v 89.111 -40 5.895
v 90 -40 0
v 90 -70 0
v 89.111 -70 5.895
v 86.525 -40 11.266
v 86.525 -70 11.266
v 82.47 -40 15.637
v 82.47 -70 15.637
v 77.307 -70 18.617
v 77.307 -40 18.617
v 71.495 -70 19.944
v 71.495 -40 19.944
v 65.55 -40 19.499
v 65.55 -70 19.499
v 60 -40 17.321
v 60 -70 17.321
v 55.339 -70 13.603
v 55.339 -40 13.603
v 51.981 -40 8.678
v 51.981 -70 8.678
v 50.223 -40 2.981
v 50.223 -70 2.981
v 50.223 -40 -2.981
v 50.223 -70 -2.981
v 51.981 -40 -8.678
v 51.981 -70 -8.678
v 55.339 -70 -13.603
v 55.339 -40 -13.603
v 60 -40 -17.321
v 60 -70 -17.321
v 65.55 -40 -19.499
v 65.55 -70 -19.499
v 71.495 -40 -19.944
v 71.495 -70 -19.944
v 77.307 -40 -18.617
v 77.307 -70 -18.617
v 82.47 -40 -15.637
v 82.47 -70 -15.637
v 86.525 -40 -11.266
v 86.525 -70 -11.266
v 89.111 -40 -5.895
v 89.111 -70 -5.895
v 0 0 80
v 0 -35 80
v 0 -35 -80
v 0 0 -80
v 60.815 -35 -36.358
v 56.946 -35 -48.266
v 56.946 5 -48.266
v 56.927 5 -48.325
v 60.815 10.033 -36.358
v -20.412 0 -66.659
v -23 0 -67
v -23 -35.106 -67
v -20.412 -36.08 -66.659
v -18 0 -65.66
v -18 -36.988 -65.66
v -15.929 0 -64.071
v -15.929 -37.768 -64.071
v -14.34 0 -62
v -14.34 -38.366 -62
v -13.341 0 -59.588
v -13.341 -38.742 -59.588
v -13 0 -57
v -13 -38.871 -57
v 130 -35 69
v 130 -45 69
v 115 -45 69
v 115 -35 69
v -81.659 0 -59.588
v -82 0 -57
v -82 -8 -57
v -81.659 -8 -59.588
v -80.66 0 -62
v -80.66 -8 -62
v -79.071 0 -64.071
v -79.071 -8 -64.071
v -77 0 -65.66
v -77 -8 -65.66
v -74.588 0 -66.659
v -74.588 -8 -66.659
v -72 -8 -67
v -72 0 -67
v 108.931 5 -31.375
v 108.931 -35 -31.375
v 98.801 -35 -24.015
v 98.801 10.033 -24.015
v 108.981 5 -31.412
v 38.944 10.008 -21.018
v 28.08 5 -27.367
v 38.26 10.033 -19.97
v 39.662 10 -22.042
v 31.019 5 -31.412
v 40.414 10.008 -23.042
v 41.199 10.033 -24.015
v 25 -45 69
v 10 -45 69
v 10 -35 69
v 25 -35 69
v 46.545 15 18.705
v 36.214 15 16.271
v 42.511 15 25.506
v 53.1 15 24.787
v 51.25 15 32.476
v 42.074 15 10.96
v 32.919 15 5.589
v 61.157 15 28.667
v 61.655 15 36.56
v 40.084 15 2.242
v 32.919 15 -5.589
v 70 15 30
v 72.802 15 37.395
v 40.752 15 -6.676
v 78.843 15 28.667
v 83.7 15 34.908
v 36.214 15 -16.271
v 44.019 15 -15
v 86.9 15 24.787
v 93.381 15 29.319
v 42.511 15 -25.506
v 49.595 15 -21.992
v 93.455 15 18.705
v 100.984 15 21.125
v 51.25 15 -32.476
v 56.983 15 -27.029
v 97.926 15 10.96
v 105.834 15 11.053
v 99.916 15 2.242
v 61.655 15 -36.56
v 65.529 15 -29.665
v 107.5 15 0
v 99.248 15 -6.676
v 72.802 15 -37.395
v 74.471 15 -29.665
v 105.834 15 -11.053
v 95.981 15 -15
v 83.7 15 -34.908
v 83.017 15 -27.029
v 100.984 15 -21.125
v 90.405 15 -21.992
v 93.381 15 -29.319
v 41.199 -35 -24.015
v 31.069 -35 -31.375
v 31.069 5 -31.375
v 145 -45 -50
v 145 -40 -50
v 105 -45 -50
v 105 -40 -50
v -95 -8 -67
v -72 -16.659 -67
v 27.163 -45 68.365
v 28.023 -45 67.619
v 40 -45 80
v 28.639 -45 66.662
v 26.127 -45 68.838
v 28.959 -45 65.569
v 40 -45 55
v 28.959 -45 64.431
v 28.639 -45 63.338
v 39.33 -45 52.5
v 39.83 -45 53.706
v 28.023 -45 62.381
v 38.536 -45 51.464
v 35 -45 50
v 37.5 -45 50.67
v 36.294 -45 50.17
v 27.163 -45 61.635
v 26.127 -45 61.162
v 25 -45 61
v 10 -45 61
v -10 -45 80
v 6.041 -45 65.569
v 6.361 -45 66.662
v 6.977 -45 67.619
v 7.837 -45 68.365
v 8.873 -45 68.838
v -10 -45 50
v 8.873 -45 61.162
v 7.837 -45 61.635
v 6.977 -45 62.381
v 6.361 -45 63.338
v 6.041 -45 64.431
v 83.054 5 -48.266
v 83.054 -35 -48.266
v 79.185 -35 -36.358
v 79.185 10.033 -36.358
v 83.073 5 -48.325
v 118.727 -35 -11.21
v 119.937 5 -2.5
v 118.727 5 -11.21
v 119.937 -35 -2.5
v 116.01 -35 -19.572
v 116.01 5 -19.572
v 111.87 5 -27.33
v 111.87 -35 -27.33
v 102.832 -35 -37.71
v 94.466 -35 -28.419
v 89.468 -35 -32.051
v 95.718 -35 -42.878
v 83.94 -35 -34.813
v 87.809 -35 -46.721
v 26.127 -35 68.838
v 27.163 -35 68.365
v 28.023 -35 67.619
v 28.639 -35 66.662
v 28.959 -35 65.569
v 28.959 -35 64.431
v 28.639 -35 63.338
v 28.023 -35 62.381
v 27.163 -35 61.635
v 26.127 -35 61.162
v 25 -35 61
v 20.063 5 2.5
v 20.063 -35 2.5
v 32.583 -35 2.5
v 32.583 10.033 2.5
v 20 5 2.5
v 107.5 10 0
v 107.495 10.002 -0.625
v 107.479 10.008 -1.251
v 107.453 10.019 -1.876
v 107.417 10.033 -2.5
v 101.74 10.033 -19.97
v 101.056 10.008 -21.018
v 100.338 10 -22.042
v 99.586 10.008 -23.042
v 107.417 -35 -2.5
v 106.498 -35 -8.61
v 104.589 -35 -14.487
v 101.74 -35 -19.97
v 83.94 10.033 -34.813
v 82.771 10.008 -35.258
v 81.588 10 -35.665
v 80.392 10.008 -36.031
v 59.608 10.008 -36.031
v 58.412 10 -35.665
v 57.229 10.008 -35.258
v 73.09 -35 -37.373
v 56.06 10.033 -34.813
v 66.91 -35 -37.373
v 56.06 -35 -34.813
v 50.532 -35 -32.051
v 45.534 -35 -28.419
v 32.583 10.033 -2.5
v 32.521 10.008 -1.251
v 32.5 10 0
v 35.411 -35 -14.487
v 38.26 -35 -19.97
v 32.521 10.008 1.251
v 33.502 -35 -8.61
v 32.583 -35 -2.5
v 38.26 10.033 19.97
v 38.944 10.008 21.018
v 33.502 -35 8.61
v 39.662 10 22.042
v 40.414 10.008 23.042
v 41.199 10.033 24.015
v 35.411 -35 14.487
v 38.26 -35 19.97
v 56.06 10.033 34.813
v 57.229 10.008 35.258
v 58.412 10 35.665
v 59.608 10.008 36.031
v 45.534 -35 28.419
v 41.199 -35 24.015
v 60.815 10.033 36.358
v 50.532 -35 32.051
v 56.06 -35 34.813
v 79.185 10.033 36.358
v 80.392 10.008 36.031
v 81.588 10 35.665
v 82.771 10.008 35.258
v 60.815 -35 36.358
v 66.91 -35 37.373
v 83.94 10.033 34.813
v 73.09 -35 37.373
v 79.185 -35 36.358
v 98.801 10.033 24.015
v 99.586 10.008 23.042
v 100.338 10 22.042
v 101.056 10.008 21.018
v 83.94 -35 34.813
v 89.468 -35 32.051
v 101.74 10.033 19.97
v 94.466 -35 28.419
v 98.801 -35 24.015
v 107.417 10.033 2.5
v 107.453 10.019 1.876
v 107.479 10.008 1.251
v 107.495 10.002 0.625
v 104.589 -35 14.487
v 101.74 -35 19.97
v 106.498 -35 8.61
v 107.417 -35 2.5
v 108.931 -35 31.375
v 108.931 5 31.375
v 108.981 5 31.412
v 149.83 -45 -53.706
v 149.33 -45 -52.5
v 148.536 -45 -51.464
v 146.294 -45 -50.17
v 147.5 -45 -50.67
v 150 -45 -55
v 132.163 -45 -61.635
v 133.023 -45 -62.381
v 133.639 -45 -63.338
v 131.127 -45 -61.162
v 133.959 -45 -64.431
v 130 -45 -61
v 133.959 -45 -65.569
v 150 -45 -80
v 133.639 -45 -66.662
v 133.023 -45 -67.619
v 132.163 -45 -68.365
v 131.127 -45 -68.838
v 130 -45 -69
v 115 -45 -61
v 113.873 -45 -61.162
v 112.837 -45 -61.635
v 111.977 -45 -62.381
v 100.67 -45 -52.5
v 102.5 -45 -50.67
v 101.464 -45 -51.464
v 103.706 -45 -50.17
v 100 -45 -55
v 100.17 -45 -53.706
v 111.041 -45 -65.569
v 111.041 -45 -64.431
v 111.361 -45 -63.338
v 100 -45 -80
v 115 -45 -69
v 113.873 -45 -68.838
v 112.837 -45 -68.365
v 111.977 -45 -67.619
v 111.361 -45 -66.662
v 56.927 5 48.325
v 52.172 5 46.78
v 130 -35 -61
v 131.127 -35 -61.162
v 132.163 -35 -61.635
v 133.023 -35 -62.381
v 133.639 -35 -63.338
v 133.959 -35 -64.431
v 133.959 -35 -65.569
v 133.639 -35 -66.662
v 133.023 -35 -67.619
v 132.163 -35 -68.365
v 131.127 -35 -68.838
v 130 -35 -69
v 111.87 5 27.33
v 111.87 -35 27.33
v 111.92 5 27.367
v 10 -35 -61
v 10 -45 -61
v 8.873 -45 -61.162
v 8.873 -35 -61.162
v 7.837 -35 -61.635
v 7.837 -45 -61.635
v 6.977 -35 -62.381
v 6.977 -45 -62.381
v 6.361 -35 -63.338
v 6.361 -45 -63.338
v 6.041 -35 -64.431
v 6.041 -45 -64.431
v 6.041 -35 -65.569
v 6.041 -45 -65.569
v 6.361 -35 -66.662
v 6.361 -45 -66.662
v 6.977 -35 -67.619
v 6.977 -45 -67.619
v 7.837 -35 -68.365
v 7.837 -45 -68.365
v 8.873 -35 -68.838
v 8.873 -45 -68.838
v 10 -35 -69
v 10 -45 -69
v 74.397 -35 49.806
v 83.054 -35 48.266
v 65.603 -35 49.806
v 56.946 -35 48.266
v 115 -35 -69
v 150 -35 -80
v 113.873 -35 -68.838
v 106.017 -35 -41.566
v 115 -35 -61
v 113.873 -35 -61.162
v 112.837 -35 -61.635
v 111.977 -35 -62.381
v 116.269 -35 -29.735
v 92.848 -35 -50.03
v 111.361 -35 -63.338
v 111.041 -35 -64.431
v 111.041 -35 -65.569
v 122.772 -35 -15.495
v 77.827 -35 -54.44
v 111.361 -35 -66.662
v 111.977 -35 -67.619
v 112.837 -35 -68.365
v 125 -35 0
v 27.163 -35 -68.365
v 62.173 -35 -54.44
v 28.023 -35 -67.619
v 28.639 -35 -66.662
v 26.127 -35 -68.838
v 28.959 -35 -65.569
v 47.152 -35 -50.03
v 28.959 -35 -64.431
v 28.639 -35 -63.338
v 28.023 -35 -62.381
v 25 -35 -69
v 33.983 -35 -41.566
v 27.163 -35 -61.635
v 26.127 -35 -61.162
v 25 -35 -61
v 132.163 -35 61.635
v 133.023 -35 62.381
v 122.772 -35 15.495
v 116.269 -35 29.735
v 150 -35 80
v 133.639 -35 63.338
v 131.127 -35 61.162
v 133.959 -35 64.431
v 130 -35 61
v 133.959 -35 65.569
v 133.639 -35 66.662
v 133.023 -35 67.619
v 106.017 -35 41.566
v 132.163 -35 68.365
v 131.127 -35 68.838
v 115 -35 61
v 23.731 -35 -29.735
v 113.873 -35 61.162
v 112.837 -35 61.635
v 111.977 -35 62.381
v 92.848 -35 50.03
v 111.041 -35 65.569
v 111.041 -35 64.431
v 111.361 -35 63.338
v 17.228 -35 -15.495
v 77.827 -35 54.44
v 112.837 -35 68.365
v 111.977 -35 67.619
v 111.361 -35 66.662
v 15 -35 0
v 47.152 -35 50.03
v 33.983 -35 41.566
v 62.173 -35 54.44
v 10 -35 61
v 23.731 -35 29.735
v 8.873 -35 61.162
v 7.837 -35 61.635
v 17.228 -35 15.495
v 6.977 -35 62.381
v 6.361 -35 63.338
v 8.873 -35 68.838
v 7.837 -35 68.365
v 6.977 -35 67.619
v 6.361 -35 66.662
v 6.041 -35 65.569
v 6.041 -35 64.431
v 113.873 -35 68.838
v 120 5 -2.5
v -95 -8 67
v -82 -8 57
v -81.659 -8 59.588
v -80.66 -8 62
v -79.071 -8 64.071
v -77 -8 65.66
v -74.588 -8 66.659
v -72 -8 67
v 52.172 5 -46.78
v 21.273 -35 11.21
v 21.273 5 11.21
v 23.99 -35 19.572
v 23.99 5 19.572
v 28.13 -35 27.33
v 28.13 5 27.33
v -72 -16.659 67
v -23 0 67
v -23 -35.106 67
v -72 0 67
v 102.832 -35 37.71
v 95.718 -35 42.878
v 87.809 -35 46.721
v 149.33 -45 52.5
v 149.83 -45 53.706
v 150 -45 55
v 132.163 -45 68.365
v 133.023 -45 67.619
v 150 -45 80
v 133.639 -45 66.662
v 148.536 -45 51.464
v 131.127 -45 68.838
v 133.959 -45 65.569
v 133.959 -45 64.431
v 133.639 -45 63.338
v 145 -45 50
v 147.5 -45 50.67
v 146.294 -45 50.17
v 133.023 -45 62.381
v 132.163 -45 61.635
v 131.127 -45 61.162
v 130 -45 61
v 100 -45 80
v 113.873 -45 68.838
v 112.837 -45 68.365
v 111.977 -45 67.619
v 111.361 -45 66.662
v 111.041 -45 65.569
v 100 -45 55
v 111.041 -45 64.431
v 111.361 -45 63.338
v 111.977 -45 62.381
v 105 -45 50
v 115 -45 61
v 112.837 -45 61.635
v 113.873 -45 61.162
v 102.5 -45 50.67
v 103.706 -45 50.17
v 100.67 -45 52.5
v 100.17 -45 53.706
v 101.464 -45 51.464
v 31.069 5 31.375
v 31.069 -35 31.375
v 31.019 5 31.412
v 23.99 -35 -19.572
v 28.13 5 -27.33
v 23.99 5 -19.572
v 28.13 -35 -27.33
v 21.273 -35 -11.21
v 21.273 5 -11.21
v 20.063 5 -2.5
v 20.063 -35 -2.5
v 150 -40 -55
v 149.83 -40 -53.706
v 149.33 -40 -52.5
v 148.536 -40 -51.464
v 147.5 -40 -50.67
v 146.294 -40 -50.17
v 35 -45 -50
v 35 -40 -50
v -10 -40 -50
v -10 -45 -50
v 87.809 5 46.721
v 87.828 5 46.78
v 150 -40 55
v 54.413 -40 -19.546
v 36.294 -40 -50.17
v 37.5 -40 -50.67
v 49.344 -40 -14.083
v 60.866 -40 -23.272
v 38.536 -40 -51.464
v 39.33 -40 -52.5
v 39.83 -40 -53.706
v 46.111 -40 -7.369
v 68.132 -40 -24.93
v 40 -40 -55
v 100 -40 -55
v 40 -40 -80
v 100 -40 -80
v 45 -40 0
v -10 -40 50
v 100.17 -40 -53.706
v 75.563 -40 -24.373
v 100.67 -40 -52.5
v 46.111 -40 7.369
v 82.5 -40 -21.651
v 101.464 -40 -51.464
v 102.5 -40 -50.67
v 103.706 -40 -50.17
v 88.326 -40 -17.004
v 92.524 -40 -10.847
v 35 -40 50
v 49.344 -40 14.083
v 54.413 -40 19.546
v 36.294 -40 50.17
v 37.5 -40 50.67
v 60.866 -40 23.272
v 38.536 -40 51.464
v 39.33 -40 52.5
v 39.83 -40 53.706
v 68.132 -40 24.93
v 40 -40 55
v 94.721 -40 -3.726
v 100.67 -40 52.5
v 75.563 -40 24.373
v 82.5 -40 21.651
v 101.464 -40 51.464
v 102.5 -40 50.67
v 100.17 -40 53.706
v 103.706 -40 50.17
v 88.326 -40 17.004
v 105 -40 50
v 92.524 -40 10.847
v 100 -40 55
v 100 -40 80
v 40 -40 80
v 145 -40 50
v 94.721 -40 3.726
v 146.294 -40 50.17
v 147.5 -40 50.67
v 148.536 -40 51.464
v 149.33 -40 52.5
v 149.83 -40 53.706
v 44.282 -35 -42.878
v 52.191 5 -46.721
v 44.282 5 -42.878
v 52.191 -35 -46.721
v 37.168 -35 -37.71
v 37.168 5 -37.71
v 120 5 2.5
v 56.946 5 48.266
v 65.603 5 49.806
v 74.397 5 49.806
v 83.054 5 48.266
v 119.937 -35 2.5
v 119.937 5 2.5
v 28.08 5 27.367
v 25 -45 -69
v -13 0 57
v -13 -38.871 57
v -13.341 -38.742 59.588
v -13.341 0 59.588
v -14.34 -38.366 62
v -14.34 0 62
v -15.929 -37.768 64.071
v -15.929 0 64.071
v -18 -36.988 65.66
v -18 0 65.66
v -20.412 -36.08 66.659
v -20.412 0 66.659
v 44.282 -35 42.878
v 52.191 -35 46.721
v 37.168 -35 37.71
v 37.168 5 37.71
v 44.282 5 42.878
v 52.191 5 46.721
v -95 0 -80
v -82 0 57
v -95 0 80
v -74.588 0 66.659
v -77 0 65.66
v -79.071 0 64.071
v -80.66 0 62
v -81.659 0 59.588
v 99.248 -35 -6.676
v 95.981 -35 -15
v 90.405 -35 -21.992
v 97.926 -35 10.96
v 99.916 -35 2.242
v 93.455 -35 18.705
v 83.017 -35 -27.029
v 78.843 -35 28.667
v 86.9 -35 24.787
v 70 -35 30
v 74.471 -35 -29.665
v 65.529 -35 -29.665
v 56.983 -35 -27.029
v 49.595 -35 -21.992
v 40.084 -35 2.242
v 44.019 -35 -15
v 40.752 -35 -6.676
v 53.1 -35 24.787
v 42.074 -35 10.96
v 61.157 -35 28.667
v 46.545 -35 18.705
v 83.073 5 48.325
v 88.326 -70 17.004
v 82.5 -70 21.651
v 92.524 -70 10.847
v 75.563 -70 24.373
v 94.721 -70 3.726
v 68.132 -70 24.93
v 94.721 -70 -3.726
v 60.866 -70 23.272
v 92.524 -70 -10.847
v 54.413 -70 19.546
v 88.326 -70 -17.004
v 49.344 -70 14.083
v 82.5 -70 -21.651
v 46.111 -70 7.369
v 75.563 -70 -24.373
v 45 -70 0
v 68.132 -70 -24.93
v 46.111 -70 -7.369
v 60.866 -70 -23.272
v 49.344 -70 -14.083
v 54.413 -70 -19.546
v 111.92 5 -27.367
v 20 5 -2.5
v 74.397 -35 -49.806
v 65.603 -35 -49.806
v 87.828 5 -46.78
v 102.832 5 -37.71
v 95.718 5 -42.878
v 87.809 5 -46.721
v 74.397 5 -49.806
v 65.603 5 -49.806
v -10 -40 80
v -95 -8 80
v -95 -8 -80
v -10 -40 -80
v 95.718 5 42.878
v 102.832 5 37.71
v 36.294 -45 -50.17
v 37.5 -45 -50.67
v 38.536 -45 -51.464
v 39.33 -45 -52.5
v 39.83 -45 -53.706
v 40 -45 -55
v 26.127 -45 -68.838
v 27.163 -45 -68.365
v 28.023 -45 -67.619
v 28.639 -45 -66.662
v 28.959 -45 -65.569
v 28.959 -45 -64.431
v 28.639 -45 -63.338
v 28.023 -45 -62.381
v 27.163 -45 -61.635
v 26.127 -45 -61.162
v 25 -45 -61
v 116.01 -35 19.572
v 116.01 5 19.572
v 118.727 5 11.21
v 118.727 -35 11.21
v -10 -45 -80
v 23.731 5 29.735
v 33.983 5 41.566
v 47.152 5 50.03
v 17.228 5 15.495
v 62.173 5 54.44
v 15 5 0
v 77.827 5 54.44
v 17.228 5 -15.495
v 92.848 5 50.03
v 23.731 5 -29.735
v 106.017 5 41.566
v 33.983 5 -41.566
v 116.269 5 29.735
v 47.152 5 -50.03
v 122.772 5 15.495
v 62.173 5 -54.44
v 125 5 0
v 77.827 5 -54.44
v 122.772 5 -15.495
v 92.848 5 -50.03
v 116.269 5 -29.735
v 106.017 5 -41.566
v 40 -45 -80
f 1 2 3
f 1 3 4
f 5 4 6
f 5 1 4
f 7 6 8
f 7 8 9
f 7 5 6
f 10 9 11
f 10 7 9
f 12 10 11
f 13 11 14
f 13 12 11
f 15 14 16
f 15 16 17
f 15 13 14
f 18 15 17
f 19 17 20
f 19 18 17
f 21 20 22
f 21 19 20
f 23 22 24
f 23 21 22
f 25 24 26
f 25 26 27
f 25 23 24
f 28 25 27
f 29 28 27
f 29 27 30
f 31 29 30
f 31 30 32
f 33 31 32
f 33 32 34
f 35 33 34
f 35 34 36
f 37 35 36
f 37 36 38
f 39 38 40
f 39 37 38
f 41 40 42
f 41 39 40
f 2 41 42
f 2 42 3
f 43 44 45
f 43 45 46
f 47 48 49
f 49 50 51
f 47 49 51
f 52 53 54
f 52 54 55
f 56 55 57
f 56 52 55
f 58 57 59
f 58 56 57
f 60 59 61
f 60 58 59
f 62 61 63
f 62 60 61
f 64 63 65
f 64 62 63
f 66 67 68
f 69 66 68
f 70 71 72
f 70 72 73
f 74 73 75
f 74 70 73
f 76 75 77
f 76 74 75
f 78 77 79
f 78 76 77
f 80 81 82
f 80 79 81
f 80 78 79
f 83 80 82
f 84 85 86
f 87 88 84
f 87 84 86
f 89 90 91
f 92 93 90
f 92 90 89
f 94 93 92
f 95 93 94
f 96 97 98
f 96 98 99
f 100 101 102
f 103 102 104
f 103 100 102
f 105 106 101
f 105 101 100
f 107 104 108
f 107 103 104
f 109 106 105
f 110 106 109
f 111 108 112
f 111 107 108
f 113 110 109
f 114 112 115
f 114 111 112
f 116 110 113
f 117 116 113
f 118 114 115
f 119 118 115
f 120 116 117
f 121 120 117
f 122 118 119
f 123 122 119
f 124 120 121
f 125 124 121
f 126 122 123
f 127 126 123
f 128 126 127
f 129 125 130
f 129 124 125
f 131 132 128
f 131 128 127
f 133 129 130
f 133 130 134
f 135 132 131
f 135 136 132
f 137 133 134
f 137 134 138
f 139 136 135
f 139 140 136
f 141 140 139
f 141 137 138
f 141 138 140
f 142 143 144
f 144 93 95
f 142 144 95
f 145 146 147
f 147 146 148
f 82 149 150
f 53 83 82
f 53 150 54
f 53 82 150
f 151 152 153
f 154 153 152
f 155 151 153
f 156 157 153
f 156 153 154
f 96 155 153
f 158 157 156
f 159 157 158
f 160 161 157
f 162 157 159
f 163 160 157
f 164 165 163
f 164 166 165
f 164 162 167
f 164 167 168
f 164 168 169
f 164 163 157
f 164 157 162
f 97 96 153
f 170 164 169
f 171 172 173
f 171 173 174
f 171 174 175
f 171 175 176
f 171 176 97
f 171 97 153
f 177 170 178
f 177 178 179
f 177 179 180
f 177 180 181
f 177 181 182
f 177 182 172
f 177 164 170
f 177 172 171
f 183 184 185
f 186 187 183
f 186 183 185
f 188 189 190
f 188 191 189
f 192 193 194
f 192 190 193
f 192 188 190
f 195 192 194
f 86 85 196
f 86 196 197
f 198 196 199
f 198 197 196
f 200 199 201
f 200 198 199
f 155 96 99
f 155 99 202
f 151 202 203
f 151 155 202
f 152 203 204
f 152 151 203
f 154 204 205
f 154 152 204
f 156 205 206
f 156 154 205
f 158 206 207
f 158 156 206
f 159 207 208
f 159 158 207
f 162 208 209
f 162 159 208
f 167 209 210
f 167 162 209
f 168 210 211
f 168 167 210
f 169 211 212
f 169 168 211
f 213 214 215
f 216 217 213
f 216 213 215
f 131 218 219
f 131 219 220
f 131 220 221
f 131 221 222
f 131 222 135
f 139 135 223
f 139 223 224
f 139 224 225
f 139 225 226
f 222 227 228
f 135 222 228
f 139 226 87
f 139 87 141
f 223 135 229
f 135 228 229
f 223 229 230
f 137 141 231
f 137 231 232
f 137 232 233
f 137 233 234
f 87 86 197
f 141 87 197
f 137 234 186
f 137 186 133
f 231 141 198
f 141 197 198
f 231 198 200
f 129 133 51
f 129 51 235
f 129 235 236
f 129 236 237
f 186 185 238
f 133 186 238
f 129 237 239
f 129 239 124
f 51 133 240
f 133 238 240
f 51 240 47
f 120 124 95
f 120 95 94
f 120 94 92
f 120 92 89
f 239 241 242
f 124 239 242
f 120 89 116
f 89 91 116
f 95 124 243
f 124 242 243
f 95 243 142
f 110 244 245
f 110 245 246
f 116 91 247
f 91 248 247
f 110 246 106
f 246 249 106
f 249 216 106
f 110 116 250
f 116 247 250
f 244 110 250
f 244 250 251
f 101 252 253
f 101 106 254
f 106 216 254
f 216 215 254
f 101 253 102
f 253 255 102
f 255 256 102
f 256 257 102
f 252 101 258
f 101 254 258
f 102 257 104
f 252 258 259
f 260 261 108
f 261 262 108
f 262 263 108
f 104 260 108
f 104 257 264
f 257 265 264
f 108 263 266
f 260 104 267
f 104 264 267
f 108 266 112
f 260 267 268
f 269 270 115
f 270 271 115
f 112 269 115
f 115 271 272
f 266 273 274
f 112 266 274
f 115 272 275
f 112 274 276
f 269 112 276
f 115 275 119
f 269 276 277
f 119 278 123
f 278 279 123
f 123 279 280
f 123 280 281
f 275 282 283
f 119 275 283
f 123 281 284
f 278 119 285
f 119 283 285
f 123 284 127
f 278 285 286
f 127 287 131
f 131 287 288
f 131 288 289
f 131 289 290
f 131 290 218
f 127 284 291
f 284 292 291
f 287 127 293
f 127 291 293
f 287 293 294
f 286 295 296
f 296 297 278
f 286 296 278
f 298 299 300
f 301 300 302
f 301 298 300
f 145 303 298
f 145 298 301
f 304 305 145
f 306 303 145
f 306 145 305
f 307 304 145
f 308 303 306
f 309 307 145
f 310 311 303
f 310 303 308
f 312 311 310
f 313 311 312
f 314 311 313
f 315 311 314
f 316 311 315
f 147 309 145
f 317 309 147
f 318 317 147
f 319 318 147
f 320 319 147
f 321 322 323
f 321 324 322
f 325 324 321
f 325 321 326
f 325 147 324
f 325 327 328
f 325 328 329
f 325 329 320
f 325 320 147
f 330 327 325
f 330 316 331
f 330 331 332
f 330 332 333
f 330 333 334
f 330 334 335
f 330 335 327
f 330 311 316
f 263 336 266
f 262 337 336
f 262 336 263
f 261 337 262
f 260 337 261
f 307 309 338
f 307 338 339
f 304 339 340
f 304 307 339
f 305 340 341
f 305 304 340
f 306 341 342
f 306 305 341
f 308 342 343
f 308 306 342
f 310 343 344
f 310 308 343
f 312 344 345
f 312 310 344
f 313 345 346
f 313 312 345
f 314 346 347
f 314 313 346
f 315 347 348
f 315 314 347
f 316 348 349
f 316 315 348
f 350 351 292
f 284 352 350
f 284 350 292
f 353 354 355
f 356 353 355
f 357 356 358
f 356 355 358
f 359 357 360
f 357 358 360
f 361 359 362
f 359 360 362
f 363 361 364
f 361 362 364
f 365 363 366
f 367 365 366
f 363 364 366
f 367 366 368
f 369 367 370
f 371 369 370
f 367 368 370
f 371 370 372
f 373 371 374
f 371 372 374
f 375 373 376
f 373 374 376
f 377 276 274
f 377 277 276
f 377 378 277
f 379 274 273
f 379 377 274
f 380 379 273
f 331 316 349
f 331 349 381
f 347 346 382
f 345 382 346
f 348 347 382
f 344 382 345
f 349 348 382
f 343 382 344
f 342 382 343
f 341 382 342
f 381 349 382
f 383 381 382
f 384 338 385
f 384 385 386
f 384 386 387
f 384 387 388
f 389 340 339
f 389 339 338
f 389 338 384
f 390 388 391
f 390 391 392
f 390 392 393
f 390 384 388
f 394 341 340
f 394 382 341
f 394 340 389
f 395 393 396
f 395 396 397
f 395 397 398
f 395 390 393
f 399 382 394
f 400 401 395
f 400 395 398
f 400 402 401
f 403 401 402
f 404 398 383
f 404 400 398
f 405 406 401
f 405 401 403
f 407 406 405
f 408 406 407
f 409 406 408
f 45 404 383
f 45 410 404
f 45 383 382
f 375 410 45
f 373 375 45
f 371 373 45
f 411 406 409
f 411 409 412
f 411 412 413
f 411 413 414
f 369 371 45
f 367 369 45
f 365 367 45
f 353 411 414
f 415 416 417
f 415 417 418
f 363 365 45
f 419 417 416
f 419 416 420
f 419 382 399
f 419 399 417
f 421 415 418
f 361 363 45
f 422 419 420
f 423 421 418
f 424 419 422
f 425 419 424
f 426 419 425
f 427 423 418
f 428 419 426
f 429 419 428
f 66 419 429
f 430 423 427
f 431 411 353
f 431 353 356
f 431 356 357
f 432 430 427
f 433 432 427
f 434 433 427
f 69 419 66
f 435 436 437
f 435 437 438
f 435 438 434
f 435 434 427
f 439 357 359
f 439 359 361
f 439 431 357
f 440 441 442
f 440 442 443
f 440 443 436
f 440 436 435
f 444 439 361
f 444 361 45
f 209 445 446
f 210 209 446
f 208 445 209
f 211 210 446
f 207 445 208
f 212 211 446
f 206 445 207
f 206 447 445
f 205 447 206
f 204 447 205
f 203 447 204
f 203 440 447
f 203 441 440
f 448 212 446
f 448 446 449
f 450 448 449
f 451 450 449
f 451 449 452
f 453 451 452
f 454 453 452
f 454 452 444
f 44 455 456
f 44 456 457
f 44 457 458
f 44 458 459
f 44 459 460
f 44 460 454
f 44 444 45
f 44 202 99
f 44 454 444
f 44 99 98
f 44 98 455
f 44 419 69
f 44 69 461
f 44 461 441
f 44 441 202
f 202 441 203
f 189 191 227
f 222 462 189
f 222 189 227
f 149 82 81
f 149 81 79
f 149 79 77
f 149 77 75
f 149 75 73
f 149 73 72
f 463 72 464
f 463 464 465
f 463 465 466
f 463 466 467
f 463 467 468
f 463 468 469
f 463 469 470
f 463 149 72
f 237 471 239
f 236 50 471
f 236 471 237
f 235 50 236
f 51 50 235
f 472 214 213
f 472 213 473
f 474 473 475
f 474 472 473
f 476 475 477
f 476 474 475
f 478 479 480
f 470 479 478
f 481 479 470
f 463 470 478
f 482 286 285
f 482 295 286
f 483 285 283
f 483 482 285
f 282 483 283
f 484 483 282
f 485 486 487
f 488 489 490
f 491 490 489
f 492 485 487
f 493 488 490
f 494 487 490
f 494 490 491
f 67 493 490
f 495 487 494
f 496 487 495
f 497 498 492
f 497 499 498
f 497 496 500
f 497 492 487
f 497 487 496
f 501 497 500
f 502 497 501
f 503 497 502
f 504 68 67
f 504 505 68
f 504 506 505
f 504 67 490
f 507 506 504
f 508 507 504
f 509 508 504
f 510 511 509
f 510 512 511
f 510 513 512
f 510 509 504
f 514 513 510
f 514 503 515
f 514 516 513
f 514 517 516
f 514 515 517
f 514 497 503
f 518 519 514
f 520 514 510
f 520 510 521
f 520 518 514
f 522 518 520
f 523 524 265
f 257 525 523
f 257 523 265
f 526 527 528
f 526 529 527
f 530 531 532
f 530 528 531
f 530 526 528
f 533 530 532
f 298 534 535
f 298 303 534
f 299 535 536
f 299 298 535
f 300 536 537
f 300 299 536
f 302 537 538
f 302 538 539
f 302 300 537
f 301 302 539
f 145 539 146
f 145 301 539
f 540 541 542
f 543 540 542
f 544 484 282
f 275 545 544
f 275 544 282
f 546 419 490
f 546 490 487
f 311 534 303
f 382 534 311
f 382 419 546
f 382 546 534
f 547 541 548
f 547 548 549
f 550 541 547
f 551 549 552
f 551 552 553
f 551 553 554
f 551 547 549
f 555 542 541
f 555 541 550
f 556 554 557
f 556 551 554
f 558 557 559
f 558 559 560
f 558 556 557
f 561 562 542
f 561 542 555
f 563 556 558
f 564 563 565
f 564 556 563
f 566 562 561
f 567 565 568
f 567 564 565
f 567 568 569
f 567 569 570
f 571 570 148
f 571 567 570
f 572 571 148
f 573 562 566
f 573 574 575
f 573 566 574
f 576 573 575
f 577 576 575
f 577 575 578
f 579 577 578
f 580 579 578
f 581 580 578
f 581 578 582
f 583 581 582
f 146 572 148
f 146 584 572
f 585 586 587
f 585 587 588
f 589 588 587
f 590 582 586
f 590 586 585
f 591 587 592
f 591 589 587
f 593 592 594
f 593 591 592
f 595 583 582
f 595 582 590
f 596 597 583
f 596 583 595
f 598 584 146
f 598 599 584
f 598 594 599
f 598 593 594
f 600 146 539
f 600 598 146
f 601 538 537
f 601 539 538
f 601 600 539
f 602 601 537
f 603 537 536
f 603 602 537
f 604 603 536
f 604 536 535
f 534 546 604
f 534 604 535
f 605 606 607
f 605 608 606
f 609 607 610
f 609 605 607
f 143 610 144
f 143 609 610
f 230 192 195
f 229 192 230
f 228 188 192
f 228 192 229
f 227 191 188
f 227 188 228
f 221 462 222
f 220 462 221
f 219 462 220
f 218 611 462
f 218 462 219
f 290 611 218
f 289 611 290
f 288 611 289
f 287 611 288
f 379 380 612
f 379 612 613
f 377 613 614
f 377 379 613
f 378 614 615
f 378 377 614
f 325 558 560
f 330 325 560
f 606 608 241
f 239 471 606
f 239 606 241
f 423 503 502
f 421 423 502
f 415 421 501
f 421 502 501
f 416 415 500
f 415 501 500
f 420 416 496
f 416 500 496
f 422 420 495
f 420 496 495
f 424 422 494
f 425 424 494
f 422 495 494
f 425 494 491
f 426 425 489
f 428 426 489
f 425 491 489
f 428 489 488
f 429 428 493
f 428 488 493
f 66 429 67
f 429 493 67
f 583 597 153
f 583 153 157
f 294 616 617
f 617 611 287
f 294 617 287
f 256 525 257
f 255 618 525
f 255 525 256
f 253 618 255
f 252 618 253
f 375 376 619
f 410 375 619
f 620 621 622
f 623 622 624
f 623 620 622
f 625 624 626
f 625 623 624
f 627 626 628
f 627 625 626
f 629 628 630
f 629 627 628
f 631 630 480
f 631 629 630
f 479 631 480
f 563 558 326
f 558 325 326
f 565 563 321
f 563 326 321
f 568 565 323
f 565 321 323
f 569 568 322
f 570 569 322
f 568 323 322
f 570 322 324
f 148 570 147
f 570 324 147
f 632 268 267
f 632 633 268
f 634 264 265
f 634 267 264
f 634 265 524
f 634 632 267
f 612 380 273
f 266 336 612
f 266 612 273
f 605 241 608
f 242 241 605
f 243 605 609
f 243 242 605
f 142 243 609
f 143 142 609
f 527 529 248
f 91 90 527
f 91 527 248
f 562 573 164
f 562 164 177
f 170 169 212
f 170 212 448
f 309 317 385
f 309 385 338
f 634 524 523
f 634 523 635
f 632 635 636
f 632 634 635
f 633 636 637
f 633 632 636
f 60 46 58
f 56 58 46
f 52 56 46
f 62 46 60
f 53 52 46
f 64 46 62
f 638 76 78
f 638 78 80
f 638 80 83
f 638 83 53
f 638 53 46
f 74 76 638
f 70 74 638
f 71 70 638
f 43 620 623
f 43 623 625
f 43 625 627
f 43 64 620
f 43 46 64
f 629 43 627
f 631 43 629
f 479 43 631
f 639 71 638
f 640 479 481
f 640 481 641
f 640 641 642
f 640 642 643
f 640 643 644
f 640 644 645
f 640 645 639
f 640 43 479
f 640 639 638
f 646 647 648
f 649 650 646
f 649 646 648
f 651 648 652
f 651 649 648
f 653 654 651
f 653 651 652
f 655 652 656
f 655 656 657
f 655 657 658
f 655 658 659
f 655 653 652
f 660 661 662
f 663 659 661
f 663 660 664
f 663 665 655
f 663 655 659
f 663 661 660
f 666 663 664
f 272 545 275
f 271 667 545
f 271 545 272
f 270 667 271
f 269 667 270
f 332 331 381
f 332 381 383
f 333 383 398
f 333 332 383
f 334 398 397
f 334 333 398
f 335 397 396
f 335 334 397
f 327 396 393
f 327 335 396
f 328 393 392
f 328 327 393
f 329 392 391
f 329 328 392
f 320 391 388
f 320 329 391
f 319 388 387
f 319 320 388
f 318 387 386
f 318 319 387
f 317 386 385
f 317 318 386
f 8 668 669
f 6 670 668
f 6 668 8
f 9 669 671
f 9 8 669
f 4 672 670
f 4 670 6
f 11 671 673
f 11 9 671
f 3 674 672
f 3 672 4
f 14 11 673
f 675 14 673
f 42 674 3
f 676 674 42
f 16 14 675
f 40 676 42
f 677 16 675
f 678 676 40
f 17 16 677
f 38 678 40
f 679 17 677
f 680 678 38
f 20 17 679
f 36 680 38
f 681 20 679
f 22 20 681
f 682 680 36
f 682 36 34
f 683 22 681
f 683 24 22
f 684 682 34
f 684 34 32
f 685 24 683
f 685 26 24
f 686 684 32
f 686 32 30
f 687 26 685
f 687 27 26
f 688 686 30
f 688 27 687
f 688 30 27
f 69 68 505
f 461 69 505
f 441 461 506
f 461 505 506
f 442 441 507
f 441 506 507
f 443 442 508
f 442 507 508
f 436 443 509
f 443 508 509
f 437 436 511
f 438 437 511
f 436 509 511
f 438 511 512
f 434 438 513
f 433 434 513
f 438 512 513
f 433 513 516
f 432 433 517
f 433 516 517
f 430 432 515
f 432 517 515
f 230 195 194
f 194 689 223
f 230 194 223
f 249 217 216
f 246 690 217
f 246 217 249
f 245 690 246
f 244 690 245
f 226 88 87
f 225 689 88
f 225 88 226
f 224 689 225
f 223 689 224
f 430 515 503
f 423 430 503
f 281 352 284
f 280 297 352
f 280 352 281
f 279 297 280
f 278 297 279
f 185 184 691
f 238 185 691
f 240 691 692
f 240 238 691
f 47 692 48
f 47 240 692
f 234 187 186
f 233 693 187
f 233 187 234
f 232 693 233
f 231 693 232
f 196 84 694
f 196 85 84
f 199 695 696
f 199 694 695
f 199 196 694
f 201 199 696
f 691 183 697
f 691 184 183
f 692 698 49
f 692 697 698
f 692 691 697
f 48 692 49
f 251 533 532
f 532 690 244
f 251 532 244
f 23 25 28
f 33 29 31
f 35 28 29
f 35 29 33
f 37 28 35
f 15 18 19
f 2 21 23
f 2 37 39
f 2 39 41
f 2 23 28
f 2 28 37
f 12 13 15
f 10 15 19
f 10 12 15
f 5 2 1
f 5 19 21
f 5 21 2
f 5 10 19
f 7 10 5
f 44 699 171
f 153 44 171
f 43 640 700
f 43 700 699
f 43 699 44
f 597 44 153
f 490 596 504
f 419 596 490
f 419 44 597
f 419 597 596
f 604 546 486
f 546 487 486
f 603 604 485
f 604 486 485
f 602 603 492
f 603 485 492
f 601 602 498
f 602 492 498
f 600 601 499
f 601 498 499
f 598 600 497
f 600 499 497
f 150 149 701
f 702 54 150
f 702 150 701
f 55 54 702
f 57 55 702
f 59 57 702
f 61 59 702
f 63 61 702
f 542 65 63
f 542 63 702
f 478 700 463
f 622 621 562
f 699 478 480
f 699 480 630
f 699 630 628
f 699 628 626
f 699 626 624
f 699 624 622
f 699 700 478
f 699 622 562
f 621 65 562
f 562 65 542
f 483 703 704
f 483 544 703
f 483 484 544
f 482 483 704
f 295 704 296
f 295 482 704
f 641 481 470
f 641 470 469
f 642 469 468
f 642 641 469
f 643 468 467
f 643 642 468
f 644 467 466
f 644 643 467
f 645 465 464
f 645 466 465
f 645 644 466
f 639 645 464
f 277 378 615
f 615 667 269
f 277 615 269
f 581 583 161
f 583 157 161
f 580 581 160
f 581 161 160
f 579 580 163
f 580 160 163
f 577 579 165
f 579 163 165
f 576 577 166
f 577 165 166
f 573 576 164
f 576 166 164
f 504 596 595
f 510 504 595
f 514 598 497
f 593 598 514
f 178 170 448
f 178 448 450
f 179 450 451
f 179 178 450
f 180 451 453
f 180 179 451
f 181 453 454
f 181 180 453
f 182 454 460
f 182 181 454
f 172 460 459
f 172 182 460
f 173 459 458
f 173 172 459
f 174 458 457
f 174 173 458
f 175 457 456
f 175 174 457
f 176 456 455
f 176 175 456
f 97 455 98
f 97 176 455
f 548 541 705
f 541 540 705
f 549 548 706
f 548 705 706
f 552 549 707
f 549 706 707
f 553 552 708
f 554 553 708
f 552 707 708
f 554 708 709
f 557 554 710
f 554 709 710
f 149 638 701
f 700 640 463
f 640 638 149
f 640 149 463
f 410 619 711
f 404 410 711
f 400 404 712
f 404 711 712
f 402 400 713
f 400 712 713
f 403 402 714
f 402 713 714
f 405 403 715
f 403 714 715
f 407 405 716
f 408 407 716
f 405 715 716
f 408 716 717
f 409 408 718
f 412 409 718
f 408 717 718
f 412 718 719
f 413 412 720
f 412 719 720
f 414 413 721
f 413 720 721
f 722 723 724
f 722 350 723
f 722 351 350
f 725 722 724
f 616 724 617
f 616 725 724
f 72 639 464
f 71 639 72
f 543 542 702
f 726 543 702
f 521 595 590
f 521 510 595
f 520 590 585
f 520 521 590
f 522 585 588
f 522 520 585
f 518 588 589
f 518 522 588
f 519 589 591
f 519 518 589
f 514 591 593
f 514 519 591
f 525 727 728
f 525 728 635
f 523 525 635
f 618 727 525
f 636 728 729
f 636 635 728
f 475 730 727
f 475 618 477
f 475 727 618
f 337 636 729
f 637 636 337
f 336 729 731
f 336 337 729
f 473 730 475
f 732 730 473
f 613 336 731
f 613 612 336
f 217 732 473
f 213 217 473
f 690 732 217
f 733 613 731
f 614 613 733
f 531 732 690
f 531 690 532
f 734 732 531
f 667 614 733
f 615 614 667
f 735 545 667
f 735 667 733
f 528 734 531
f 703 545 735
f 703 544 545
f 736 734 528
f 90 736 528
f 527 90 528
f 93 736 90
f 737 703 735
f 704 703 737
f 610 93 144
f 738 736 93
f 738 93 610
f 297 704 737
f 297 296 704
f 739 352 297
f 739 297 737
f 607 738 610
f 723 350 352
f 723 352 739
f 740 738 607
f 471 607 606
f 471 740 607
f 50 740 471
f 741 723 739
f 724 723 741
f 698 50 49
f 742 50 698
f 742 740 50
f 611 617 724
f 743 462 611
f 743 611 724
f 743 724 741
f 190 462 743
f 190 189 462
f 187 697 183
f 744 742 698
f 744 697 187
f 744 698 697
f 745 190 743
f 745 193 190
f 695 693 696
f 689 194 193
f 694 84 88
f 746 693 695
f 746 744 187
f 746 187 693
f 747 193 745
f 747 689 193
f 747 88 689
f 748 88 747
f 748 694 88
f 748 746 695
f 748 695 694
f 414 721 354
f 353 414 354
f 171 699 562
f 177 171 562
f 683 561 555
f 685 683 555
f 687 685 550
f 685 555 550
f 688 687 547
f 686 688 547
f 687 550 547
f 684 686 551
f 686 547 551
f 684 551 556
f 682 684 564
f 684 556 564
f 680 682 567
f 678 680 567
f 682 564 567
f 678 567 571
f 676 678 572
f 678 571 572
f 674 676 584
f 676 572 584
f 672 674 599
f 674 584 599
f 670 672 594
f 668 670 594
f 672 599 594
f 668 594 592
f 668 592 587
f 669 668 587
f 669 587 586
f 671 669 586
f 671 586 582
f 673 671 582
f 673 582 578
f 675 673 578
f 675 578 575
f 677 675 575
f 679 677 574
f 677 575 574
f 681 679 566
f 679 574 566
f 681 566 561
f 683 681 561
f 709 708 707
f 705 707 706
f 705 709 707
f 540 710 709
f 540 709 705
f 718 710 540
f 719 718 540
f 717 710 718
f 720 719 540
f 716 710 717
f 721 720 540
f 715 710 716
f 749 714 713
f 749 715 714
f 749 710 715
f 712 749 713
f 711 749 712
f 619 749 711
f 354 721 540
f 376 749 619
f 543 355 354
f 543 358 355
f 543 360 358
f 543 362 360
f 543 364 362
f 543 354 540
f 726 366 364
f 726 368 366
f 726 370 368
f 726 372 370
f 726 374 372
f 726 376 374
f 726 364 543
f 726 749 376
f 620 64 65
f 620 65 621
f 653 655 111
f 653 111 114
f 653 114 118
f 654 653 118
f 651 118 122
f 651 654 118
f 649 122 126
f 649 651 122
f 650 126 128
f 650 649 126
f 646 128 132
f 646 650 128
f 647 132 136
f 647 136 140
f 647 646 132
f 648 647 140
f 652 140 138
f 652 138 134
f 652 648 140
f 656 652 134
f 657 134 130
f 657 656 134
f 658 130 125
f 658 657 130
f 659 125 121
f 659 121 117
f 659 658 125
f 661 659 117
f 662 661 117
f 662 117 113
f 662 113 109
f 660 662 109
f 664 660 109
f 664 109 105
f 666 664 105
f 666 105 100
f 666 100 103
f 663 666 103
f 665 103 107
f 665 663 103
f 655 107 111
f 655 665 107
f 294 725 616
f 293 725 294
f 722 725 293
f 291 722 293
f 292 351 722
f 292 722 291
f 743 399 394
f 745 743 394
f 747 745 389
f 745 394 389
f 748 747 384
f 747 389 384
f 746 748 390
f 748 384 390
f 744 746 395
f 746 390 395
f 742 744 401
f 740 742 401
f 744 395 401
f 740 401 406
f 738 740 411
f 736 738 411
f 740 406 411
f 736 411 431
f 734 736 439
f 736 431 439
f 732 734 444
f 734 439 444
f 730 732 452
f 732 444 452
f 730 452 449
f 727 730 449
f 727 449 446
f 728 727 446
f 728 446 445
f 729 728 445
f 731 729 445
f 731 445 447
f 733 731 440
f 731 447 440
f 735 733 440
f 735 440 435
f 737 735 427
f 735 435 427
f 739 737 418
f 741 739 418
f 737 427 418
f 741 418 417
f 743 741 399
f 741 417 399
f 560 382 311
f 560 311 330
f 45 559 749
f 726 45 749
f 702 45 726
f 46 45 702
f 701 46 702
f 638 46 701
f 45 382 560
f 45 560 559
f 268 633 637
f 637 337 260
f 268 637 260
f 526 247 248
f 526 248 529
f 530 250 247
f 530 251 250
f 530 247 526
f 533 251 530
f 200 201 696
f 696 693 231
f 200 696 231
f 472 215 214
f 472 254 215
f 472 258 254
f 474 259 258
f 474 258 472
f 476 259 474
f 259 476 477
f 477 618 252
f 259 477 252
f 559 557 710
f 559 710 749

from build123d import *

# Parameters (mm, degrees)
BOSS_EXTRUDE1_DEPTH = 80
CUT_EXTRUDE1_REACH  = 42
CUT_EXTRUDE2_REACH  = 247
SKETCH3_W           = 134
SKETCH3_H           = 8.658823529
SKETCH4_R           = 25
SKETCH4_R_2         = 20
BOSS_EXTRUDE2_DEPTH = 30
SKETCH5_W           = 50
SKETCH5_H           = 30
BOSS_EXTRUDE4_DEPTH = 5
FILLET1_R           = 5
CUT_EXTRUDE5_REACH  = 47
SKETCH11_R          = 37.5
SKETCH11_R_2        = 30
BOSS_EXTRUDE6_DEPTH = 50
SKETCH12_R          = 55
SKETCH12_R_2        = 50
BOSS_EXTRUDE7_DEPTH = 40
RIB1_REACH          = 82
SKETCH13_WALL_W     = 175.462912018
SKETCH13_WALL_H     = 5
CIRPATTERN1_COUNT   = 10


with BuildPart() as part:
    # Sketch1 → Boss-Extrude1 (new body, symmetric)
    with BuildSketch(Plane.XY):
        Polygon((150, -40), (150, -35), (0, -35), (0, 0), (-95, 0), (-95, -8), (-10, -40), align=None)
    extrude(amount=BOSS_EXTRUDE1_DEPTH, both=True)

    # Cut-Extrude1: up to this plane
    cut_extrude1_end = Plane(origin=(-95, -8, 80), z_dir=(0.352329759, 0.935875922, 0))
    # Sketch2 → Cut-Extrude1 (cut, up to the surface)
    with BuildSketch(Plane(origin=(0, 0, 0), x_dir=(-1, 0, 0), z_dir=(0, 1, 0)), mode=Mode.PRIVATE) as cut_extrude1_sk1:
        with BuildLine():
            Line((23, 67), (72, 67))
            ThreePointArc((72, 67), (79.071067812, 64.071067812), (82, 57))
            Line((82, 57), (82, -57))
            ThreePointArc((82, -57), (79.071067812, -64.071067812), (72, -67))
            Line((72, -67), (23, -67))
            ThreePointArc((23, -67), (15.928932188, -64.071067812), (13, -57))
            Line((13, -57), (13, 57))
            ThreePointArc((13, 57), (15.928932188, 64.071067812), (23, 67))
        make_face()
    cut_extrude1_tool1 = split(extrude(cut_extrude1_sk1.sketch, amount=-CUT_EXTRUDE1_REACH, mode=Mode.PRIVATE), bisect_by=cut_extrude1_end, keep=Keep.BOTH, mode=Mode.PRIVATE)
    add(cut_extrude1_tool1.solids().sort_by_distance((-47.5, 0, 0))[0], mode=Mode.SUBTRACT)

    # Sketch3 → Cut-Extrude2 (cut, up to next)
    with BuildSketch(Plane.ZY.offset(95), mode=Mode.PRIVATE) as cut_extrude2_sk1:
        with Locations((0, -12.329411764)):
            Rectangle(SKETCH3_W, SKETCH3_H)
    cut_extrude2_tool1 = extrude(cut_extrude2_sk1.sketch, amount=-CUT_EXTRUDE2_REACH, mode=Mode.PRIVATE) & part.part
    add(cut_extrude2_tool1.solids().sort_by_distance((-95, -12.329412, 0))[0], mode=Mode.SUBTRACT)

    # Sketch4 → Boss-Extrude2 (add)
    with BuildSketch(Plane(origin=(0, -40, 0), x_dir=(-1, 0, 0), z_dir=(0, -1, 0))):
        with Locations((-70, 0)):
            Circle(SKETCH4_R)
        with Locations(Location((-70, 0, 0), (0, 0, 180))):  # turned: the seam where the file's is
            Circle(SKETCH4_R_2, mode=Mode.SUBTRACT)
    extrude(amount=BOSS_EXTRUDE2_DEPTH)

    # Sketch5 → Boss-Extrude4 (add)
    with BuildSketch(Plane(origin=(0, -40, 0), x_dir=(-1, 0, 0), z_dir=(0, -1, 0))):
        with Locations((-125, 65)):
            Rectangle(SKETCH5_W, SKETCH5_H)
        with Locations((-15, 65)):
            Rectangle(SKETCH5_W, SKETCH5_H)
        with Locations((-15, -65)):
            Rectangle(SKETCH5_W, SKETCH5_H)
        with Locations((-125, -65)):
            Rectangle(SKETCH5_W, SKETCH5_H)
    extrude(amount=BOSS_EXTRUDE4_DEPTH)

    # Fillet1
    fillet1_edges = [part.edges().sort_by_distance(p)[0] for p in [
        (150, -42.5, 50),
        (100, -42.5, 50),
        (150, -42.5, -50),
        (100, -42.5, -50),
        (40, -42.5, -50),
        (40, -42.5, 50),
    ]]
    fillet(fillet1_edges, radius=FILLET1_R)

    # Sketch10 → Cut-Extrude5 (cut, up to next)
    with BuildSketch(Plane(origin=(0, -45, 0), x_dir=(-1, 0, 0), z_dir=(0, -1, 0)), mode=Mode.PRIVATE) as cut_extrude5_sk1:
        with BuildLine():
            Line((-130, 69), (-115, 69))
            ThreePointArc((-115, 69), (-111, 65), (-115, 61))
            Line((-115, 61), (-130, 61))
            ThreePointArc((-130, 61), (-134, 65), (-130, 69))
        make_face()
    cut_extrude5_tool1 = extrude(cut_extrude5_sk1.sketch, amount=-CUT_EXTRUDE5_REACH, mode=Mode.PRIVATE) & part.part
    add(cut_extrude5_tool1.solids().sort_by_distance((122.5, -45, -65))[0], mode=Mode.SUBTRACT)
    # Sketch10 → Cut-Extrude5 (cut, up to next)
    with BuildSketch(Plane(origin=(0, -45, 0), x_dir=(-1, 0, 0), z_dir=(0, -1, 0)), mode=Mode.PRIVATE) as cut_extrude5_sk2:
        with BuildLine():
            Line((-10, 69), (-25, 69))
            ThreePointArc((-25, 69), (-29, 65), (-25, 61))
            Line((-25, 61), (-10, 61))
            ThreePointArc((-10, 61), (-6, 65), (-10, 69))
        make_face()
    cut_extrude5_tool2 = extrude(cut_extrude5_sk2.sketch, amount=-CUT_EXTRUDE5_REACH, mode=Mode.PRIVATE) & part.part
    add(cut_extrude5_tool2.solids().sort_by_distance((17.5, -45, -65))[0], mode=Mode.SUBTRACT)
    # Sketch10 → Cut-Extrude5 (cut, up to next)
    with BuildSketch(Plane(origin=(0, -45, 0), x_dir=(-1, 0, 0), z_dir=(0, -1, 0)), mode=Mode.PRIVATE) as cut_extrude5_sk3:
        with BuildLine():
            Line((-130, -69), (-115, -69))
            ThreePointArc((-115, -69), (-111, -65), (-115, -61))
            Line((-115, -61), (-130, -61))
            ThreePointArc((-130, -61), (-134, -65), (-130, -69))
        make_face()
    cut_extrude5_tool3 = extrude(cut_extrude5_sk3.sketch, amount=-CUT_EXTRUDE5_REACH, mode=Mode.PRIVATE) & part.part
    add(cut_extrude5_tool3.solids().sort_by_distance((122.5, -45, 65))[0], mode=Mode.SUBTRACT)
    # Sketch10 → Cut-Extrude5 (cut, up to next)
    with BuildSketch(Plane(origin=(0, -45, 0), x_dir=(-1, 0, 0), z_dir=(0, -1, 0)), mode=Mode.PRIVATE) as cut_extrude5_sk4:
        with BuildLine():
            Line((-10, -69), (-25, -69))
            ThreePointArc((-25, -69), (-29, -65), (-25, -61))
            Line((-25, -61), (-10, -61))
            ThreePointArc((-10, -61), (-6, -65), (-10, -69))
        make_face()
    cut_extrude5_tool4 = extrude(cut_extrude5_sk4.sketch, amount=-CUT_EXTRUDE5_REACH, mode=Mode.PRIVATE) & part.part
    add(cut_extrude5_tool4.solids().sort_by_distance((17.5, -45, 65))[0], mode=Mode.SUBTRACT)

    # Sketch11 → Boss-Extrude6 (add)
    with BuildSketch(Plane(origin=(0, -35, 0), x_dir=(-1, 0, 0), z_dir=(0, 1, 0))):
        with Locations(Location((-70, 0, 0), (0, 0, 180))):  # turned: the seam where the file's is
            Circle(SKETCH11_R)
        with Locations(Location((-70, 0, 0), (0, 0, 90))):  # turned: the seam where the file's is
            Circle(SKETCH11_R_2, mode=Mode.SUBTRACT)
    extrude(amount=BOSS_EXTRUDE6_DEPTH)

    # Sketch12 → Boss-Extrude7 (add)
    with BuildSketch(Plane(origin=(0, -35, 0), x_dir=(-1, 0, 0), z_dir=(0, 1, 0))):
        with Locations(Location((-70, 0, 0), (0, 0, 180))):  # turned: the seam where the file's is
            Circle(SKETCH12_R)
        with Locations(Location((-70, 0, 0), (0, 0, 90))):  # turned: the seam where the file's is
            Circle(SKETCH12_R_2, mode=Mode.SUBTRACT)
    extrude(amount=BOSS_EXTRUDE7_DEPTH)

    # Sketch13 wall → Rib1 (add, up to next)
    with BuildSketch(Plane(origin=(26.25, 7.5, 0), x_dir=(0.928476691, 0.371390676, 0), z_dir=(-0.371390676, 0.928476691, 0)), mode=Mode.PRIVATE) as rib1_sk1:
        Rectangle(SKETCH13_WALL_W, SKETCH13_WALL_H)
    rib1_tool1 = extrude(rib1_sk1.sketch, amount=-RIB1_REACH, mode=Mode.PRIVATE) - part.part
    rib1 = rib1_tool1.solids().sort_by_distance((26.25, 7.5, 0))[0]
    add(rib1)

    # CirPattern1: Rib1 ×10 about axis
    cirpattern1_axis = Axis((70, 0, 0), (0, 1, 0))
    for i in range(1, CIRPATTERN1_COUNT):
        add(rib1.rotate(cirpattern1_axis, i * 360 / CIRPATTERN1_COUNT))


solid = part.part
